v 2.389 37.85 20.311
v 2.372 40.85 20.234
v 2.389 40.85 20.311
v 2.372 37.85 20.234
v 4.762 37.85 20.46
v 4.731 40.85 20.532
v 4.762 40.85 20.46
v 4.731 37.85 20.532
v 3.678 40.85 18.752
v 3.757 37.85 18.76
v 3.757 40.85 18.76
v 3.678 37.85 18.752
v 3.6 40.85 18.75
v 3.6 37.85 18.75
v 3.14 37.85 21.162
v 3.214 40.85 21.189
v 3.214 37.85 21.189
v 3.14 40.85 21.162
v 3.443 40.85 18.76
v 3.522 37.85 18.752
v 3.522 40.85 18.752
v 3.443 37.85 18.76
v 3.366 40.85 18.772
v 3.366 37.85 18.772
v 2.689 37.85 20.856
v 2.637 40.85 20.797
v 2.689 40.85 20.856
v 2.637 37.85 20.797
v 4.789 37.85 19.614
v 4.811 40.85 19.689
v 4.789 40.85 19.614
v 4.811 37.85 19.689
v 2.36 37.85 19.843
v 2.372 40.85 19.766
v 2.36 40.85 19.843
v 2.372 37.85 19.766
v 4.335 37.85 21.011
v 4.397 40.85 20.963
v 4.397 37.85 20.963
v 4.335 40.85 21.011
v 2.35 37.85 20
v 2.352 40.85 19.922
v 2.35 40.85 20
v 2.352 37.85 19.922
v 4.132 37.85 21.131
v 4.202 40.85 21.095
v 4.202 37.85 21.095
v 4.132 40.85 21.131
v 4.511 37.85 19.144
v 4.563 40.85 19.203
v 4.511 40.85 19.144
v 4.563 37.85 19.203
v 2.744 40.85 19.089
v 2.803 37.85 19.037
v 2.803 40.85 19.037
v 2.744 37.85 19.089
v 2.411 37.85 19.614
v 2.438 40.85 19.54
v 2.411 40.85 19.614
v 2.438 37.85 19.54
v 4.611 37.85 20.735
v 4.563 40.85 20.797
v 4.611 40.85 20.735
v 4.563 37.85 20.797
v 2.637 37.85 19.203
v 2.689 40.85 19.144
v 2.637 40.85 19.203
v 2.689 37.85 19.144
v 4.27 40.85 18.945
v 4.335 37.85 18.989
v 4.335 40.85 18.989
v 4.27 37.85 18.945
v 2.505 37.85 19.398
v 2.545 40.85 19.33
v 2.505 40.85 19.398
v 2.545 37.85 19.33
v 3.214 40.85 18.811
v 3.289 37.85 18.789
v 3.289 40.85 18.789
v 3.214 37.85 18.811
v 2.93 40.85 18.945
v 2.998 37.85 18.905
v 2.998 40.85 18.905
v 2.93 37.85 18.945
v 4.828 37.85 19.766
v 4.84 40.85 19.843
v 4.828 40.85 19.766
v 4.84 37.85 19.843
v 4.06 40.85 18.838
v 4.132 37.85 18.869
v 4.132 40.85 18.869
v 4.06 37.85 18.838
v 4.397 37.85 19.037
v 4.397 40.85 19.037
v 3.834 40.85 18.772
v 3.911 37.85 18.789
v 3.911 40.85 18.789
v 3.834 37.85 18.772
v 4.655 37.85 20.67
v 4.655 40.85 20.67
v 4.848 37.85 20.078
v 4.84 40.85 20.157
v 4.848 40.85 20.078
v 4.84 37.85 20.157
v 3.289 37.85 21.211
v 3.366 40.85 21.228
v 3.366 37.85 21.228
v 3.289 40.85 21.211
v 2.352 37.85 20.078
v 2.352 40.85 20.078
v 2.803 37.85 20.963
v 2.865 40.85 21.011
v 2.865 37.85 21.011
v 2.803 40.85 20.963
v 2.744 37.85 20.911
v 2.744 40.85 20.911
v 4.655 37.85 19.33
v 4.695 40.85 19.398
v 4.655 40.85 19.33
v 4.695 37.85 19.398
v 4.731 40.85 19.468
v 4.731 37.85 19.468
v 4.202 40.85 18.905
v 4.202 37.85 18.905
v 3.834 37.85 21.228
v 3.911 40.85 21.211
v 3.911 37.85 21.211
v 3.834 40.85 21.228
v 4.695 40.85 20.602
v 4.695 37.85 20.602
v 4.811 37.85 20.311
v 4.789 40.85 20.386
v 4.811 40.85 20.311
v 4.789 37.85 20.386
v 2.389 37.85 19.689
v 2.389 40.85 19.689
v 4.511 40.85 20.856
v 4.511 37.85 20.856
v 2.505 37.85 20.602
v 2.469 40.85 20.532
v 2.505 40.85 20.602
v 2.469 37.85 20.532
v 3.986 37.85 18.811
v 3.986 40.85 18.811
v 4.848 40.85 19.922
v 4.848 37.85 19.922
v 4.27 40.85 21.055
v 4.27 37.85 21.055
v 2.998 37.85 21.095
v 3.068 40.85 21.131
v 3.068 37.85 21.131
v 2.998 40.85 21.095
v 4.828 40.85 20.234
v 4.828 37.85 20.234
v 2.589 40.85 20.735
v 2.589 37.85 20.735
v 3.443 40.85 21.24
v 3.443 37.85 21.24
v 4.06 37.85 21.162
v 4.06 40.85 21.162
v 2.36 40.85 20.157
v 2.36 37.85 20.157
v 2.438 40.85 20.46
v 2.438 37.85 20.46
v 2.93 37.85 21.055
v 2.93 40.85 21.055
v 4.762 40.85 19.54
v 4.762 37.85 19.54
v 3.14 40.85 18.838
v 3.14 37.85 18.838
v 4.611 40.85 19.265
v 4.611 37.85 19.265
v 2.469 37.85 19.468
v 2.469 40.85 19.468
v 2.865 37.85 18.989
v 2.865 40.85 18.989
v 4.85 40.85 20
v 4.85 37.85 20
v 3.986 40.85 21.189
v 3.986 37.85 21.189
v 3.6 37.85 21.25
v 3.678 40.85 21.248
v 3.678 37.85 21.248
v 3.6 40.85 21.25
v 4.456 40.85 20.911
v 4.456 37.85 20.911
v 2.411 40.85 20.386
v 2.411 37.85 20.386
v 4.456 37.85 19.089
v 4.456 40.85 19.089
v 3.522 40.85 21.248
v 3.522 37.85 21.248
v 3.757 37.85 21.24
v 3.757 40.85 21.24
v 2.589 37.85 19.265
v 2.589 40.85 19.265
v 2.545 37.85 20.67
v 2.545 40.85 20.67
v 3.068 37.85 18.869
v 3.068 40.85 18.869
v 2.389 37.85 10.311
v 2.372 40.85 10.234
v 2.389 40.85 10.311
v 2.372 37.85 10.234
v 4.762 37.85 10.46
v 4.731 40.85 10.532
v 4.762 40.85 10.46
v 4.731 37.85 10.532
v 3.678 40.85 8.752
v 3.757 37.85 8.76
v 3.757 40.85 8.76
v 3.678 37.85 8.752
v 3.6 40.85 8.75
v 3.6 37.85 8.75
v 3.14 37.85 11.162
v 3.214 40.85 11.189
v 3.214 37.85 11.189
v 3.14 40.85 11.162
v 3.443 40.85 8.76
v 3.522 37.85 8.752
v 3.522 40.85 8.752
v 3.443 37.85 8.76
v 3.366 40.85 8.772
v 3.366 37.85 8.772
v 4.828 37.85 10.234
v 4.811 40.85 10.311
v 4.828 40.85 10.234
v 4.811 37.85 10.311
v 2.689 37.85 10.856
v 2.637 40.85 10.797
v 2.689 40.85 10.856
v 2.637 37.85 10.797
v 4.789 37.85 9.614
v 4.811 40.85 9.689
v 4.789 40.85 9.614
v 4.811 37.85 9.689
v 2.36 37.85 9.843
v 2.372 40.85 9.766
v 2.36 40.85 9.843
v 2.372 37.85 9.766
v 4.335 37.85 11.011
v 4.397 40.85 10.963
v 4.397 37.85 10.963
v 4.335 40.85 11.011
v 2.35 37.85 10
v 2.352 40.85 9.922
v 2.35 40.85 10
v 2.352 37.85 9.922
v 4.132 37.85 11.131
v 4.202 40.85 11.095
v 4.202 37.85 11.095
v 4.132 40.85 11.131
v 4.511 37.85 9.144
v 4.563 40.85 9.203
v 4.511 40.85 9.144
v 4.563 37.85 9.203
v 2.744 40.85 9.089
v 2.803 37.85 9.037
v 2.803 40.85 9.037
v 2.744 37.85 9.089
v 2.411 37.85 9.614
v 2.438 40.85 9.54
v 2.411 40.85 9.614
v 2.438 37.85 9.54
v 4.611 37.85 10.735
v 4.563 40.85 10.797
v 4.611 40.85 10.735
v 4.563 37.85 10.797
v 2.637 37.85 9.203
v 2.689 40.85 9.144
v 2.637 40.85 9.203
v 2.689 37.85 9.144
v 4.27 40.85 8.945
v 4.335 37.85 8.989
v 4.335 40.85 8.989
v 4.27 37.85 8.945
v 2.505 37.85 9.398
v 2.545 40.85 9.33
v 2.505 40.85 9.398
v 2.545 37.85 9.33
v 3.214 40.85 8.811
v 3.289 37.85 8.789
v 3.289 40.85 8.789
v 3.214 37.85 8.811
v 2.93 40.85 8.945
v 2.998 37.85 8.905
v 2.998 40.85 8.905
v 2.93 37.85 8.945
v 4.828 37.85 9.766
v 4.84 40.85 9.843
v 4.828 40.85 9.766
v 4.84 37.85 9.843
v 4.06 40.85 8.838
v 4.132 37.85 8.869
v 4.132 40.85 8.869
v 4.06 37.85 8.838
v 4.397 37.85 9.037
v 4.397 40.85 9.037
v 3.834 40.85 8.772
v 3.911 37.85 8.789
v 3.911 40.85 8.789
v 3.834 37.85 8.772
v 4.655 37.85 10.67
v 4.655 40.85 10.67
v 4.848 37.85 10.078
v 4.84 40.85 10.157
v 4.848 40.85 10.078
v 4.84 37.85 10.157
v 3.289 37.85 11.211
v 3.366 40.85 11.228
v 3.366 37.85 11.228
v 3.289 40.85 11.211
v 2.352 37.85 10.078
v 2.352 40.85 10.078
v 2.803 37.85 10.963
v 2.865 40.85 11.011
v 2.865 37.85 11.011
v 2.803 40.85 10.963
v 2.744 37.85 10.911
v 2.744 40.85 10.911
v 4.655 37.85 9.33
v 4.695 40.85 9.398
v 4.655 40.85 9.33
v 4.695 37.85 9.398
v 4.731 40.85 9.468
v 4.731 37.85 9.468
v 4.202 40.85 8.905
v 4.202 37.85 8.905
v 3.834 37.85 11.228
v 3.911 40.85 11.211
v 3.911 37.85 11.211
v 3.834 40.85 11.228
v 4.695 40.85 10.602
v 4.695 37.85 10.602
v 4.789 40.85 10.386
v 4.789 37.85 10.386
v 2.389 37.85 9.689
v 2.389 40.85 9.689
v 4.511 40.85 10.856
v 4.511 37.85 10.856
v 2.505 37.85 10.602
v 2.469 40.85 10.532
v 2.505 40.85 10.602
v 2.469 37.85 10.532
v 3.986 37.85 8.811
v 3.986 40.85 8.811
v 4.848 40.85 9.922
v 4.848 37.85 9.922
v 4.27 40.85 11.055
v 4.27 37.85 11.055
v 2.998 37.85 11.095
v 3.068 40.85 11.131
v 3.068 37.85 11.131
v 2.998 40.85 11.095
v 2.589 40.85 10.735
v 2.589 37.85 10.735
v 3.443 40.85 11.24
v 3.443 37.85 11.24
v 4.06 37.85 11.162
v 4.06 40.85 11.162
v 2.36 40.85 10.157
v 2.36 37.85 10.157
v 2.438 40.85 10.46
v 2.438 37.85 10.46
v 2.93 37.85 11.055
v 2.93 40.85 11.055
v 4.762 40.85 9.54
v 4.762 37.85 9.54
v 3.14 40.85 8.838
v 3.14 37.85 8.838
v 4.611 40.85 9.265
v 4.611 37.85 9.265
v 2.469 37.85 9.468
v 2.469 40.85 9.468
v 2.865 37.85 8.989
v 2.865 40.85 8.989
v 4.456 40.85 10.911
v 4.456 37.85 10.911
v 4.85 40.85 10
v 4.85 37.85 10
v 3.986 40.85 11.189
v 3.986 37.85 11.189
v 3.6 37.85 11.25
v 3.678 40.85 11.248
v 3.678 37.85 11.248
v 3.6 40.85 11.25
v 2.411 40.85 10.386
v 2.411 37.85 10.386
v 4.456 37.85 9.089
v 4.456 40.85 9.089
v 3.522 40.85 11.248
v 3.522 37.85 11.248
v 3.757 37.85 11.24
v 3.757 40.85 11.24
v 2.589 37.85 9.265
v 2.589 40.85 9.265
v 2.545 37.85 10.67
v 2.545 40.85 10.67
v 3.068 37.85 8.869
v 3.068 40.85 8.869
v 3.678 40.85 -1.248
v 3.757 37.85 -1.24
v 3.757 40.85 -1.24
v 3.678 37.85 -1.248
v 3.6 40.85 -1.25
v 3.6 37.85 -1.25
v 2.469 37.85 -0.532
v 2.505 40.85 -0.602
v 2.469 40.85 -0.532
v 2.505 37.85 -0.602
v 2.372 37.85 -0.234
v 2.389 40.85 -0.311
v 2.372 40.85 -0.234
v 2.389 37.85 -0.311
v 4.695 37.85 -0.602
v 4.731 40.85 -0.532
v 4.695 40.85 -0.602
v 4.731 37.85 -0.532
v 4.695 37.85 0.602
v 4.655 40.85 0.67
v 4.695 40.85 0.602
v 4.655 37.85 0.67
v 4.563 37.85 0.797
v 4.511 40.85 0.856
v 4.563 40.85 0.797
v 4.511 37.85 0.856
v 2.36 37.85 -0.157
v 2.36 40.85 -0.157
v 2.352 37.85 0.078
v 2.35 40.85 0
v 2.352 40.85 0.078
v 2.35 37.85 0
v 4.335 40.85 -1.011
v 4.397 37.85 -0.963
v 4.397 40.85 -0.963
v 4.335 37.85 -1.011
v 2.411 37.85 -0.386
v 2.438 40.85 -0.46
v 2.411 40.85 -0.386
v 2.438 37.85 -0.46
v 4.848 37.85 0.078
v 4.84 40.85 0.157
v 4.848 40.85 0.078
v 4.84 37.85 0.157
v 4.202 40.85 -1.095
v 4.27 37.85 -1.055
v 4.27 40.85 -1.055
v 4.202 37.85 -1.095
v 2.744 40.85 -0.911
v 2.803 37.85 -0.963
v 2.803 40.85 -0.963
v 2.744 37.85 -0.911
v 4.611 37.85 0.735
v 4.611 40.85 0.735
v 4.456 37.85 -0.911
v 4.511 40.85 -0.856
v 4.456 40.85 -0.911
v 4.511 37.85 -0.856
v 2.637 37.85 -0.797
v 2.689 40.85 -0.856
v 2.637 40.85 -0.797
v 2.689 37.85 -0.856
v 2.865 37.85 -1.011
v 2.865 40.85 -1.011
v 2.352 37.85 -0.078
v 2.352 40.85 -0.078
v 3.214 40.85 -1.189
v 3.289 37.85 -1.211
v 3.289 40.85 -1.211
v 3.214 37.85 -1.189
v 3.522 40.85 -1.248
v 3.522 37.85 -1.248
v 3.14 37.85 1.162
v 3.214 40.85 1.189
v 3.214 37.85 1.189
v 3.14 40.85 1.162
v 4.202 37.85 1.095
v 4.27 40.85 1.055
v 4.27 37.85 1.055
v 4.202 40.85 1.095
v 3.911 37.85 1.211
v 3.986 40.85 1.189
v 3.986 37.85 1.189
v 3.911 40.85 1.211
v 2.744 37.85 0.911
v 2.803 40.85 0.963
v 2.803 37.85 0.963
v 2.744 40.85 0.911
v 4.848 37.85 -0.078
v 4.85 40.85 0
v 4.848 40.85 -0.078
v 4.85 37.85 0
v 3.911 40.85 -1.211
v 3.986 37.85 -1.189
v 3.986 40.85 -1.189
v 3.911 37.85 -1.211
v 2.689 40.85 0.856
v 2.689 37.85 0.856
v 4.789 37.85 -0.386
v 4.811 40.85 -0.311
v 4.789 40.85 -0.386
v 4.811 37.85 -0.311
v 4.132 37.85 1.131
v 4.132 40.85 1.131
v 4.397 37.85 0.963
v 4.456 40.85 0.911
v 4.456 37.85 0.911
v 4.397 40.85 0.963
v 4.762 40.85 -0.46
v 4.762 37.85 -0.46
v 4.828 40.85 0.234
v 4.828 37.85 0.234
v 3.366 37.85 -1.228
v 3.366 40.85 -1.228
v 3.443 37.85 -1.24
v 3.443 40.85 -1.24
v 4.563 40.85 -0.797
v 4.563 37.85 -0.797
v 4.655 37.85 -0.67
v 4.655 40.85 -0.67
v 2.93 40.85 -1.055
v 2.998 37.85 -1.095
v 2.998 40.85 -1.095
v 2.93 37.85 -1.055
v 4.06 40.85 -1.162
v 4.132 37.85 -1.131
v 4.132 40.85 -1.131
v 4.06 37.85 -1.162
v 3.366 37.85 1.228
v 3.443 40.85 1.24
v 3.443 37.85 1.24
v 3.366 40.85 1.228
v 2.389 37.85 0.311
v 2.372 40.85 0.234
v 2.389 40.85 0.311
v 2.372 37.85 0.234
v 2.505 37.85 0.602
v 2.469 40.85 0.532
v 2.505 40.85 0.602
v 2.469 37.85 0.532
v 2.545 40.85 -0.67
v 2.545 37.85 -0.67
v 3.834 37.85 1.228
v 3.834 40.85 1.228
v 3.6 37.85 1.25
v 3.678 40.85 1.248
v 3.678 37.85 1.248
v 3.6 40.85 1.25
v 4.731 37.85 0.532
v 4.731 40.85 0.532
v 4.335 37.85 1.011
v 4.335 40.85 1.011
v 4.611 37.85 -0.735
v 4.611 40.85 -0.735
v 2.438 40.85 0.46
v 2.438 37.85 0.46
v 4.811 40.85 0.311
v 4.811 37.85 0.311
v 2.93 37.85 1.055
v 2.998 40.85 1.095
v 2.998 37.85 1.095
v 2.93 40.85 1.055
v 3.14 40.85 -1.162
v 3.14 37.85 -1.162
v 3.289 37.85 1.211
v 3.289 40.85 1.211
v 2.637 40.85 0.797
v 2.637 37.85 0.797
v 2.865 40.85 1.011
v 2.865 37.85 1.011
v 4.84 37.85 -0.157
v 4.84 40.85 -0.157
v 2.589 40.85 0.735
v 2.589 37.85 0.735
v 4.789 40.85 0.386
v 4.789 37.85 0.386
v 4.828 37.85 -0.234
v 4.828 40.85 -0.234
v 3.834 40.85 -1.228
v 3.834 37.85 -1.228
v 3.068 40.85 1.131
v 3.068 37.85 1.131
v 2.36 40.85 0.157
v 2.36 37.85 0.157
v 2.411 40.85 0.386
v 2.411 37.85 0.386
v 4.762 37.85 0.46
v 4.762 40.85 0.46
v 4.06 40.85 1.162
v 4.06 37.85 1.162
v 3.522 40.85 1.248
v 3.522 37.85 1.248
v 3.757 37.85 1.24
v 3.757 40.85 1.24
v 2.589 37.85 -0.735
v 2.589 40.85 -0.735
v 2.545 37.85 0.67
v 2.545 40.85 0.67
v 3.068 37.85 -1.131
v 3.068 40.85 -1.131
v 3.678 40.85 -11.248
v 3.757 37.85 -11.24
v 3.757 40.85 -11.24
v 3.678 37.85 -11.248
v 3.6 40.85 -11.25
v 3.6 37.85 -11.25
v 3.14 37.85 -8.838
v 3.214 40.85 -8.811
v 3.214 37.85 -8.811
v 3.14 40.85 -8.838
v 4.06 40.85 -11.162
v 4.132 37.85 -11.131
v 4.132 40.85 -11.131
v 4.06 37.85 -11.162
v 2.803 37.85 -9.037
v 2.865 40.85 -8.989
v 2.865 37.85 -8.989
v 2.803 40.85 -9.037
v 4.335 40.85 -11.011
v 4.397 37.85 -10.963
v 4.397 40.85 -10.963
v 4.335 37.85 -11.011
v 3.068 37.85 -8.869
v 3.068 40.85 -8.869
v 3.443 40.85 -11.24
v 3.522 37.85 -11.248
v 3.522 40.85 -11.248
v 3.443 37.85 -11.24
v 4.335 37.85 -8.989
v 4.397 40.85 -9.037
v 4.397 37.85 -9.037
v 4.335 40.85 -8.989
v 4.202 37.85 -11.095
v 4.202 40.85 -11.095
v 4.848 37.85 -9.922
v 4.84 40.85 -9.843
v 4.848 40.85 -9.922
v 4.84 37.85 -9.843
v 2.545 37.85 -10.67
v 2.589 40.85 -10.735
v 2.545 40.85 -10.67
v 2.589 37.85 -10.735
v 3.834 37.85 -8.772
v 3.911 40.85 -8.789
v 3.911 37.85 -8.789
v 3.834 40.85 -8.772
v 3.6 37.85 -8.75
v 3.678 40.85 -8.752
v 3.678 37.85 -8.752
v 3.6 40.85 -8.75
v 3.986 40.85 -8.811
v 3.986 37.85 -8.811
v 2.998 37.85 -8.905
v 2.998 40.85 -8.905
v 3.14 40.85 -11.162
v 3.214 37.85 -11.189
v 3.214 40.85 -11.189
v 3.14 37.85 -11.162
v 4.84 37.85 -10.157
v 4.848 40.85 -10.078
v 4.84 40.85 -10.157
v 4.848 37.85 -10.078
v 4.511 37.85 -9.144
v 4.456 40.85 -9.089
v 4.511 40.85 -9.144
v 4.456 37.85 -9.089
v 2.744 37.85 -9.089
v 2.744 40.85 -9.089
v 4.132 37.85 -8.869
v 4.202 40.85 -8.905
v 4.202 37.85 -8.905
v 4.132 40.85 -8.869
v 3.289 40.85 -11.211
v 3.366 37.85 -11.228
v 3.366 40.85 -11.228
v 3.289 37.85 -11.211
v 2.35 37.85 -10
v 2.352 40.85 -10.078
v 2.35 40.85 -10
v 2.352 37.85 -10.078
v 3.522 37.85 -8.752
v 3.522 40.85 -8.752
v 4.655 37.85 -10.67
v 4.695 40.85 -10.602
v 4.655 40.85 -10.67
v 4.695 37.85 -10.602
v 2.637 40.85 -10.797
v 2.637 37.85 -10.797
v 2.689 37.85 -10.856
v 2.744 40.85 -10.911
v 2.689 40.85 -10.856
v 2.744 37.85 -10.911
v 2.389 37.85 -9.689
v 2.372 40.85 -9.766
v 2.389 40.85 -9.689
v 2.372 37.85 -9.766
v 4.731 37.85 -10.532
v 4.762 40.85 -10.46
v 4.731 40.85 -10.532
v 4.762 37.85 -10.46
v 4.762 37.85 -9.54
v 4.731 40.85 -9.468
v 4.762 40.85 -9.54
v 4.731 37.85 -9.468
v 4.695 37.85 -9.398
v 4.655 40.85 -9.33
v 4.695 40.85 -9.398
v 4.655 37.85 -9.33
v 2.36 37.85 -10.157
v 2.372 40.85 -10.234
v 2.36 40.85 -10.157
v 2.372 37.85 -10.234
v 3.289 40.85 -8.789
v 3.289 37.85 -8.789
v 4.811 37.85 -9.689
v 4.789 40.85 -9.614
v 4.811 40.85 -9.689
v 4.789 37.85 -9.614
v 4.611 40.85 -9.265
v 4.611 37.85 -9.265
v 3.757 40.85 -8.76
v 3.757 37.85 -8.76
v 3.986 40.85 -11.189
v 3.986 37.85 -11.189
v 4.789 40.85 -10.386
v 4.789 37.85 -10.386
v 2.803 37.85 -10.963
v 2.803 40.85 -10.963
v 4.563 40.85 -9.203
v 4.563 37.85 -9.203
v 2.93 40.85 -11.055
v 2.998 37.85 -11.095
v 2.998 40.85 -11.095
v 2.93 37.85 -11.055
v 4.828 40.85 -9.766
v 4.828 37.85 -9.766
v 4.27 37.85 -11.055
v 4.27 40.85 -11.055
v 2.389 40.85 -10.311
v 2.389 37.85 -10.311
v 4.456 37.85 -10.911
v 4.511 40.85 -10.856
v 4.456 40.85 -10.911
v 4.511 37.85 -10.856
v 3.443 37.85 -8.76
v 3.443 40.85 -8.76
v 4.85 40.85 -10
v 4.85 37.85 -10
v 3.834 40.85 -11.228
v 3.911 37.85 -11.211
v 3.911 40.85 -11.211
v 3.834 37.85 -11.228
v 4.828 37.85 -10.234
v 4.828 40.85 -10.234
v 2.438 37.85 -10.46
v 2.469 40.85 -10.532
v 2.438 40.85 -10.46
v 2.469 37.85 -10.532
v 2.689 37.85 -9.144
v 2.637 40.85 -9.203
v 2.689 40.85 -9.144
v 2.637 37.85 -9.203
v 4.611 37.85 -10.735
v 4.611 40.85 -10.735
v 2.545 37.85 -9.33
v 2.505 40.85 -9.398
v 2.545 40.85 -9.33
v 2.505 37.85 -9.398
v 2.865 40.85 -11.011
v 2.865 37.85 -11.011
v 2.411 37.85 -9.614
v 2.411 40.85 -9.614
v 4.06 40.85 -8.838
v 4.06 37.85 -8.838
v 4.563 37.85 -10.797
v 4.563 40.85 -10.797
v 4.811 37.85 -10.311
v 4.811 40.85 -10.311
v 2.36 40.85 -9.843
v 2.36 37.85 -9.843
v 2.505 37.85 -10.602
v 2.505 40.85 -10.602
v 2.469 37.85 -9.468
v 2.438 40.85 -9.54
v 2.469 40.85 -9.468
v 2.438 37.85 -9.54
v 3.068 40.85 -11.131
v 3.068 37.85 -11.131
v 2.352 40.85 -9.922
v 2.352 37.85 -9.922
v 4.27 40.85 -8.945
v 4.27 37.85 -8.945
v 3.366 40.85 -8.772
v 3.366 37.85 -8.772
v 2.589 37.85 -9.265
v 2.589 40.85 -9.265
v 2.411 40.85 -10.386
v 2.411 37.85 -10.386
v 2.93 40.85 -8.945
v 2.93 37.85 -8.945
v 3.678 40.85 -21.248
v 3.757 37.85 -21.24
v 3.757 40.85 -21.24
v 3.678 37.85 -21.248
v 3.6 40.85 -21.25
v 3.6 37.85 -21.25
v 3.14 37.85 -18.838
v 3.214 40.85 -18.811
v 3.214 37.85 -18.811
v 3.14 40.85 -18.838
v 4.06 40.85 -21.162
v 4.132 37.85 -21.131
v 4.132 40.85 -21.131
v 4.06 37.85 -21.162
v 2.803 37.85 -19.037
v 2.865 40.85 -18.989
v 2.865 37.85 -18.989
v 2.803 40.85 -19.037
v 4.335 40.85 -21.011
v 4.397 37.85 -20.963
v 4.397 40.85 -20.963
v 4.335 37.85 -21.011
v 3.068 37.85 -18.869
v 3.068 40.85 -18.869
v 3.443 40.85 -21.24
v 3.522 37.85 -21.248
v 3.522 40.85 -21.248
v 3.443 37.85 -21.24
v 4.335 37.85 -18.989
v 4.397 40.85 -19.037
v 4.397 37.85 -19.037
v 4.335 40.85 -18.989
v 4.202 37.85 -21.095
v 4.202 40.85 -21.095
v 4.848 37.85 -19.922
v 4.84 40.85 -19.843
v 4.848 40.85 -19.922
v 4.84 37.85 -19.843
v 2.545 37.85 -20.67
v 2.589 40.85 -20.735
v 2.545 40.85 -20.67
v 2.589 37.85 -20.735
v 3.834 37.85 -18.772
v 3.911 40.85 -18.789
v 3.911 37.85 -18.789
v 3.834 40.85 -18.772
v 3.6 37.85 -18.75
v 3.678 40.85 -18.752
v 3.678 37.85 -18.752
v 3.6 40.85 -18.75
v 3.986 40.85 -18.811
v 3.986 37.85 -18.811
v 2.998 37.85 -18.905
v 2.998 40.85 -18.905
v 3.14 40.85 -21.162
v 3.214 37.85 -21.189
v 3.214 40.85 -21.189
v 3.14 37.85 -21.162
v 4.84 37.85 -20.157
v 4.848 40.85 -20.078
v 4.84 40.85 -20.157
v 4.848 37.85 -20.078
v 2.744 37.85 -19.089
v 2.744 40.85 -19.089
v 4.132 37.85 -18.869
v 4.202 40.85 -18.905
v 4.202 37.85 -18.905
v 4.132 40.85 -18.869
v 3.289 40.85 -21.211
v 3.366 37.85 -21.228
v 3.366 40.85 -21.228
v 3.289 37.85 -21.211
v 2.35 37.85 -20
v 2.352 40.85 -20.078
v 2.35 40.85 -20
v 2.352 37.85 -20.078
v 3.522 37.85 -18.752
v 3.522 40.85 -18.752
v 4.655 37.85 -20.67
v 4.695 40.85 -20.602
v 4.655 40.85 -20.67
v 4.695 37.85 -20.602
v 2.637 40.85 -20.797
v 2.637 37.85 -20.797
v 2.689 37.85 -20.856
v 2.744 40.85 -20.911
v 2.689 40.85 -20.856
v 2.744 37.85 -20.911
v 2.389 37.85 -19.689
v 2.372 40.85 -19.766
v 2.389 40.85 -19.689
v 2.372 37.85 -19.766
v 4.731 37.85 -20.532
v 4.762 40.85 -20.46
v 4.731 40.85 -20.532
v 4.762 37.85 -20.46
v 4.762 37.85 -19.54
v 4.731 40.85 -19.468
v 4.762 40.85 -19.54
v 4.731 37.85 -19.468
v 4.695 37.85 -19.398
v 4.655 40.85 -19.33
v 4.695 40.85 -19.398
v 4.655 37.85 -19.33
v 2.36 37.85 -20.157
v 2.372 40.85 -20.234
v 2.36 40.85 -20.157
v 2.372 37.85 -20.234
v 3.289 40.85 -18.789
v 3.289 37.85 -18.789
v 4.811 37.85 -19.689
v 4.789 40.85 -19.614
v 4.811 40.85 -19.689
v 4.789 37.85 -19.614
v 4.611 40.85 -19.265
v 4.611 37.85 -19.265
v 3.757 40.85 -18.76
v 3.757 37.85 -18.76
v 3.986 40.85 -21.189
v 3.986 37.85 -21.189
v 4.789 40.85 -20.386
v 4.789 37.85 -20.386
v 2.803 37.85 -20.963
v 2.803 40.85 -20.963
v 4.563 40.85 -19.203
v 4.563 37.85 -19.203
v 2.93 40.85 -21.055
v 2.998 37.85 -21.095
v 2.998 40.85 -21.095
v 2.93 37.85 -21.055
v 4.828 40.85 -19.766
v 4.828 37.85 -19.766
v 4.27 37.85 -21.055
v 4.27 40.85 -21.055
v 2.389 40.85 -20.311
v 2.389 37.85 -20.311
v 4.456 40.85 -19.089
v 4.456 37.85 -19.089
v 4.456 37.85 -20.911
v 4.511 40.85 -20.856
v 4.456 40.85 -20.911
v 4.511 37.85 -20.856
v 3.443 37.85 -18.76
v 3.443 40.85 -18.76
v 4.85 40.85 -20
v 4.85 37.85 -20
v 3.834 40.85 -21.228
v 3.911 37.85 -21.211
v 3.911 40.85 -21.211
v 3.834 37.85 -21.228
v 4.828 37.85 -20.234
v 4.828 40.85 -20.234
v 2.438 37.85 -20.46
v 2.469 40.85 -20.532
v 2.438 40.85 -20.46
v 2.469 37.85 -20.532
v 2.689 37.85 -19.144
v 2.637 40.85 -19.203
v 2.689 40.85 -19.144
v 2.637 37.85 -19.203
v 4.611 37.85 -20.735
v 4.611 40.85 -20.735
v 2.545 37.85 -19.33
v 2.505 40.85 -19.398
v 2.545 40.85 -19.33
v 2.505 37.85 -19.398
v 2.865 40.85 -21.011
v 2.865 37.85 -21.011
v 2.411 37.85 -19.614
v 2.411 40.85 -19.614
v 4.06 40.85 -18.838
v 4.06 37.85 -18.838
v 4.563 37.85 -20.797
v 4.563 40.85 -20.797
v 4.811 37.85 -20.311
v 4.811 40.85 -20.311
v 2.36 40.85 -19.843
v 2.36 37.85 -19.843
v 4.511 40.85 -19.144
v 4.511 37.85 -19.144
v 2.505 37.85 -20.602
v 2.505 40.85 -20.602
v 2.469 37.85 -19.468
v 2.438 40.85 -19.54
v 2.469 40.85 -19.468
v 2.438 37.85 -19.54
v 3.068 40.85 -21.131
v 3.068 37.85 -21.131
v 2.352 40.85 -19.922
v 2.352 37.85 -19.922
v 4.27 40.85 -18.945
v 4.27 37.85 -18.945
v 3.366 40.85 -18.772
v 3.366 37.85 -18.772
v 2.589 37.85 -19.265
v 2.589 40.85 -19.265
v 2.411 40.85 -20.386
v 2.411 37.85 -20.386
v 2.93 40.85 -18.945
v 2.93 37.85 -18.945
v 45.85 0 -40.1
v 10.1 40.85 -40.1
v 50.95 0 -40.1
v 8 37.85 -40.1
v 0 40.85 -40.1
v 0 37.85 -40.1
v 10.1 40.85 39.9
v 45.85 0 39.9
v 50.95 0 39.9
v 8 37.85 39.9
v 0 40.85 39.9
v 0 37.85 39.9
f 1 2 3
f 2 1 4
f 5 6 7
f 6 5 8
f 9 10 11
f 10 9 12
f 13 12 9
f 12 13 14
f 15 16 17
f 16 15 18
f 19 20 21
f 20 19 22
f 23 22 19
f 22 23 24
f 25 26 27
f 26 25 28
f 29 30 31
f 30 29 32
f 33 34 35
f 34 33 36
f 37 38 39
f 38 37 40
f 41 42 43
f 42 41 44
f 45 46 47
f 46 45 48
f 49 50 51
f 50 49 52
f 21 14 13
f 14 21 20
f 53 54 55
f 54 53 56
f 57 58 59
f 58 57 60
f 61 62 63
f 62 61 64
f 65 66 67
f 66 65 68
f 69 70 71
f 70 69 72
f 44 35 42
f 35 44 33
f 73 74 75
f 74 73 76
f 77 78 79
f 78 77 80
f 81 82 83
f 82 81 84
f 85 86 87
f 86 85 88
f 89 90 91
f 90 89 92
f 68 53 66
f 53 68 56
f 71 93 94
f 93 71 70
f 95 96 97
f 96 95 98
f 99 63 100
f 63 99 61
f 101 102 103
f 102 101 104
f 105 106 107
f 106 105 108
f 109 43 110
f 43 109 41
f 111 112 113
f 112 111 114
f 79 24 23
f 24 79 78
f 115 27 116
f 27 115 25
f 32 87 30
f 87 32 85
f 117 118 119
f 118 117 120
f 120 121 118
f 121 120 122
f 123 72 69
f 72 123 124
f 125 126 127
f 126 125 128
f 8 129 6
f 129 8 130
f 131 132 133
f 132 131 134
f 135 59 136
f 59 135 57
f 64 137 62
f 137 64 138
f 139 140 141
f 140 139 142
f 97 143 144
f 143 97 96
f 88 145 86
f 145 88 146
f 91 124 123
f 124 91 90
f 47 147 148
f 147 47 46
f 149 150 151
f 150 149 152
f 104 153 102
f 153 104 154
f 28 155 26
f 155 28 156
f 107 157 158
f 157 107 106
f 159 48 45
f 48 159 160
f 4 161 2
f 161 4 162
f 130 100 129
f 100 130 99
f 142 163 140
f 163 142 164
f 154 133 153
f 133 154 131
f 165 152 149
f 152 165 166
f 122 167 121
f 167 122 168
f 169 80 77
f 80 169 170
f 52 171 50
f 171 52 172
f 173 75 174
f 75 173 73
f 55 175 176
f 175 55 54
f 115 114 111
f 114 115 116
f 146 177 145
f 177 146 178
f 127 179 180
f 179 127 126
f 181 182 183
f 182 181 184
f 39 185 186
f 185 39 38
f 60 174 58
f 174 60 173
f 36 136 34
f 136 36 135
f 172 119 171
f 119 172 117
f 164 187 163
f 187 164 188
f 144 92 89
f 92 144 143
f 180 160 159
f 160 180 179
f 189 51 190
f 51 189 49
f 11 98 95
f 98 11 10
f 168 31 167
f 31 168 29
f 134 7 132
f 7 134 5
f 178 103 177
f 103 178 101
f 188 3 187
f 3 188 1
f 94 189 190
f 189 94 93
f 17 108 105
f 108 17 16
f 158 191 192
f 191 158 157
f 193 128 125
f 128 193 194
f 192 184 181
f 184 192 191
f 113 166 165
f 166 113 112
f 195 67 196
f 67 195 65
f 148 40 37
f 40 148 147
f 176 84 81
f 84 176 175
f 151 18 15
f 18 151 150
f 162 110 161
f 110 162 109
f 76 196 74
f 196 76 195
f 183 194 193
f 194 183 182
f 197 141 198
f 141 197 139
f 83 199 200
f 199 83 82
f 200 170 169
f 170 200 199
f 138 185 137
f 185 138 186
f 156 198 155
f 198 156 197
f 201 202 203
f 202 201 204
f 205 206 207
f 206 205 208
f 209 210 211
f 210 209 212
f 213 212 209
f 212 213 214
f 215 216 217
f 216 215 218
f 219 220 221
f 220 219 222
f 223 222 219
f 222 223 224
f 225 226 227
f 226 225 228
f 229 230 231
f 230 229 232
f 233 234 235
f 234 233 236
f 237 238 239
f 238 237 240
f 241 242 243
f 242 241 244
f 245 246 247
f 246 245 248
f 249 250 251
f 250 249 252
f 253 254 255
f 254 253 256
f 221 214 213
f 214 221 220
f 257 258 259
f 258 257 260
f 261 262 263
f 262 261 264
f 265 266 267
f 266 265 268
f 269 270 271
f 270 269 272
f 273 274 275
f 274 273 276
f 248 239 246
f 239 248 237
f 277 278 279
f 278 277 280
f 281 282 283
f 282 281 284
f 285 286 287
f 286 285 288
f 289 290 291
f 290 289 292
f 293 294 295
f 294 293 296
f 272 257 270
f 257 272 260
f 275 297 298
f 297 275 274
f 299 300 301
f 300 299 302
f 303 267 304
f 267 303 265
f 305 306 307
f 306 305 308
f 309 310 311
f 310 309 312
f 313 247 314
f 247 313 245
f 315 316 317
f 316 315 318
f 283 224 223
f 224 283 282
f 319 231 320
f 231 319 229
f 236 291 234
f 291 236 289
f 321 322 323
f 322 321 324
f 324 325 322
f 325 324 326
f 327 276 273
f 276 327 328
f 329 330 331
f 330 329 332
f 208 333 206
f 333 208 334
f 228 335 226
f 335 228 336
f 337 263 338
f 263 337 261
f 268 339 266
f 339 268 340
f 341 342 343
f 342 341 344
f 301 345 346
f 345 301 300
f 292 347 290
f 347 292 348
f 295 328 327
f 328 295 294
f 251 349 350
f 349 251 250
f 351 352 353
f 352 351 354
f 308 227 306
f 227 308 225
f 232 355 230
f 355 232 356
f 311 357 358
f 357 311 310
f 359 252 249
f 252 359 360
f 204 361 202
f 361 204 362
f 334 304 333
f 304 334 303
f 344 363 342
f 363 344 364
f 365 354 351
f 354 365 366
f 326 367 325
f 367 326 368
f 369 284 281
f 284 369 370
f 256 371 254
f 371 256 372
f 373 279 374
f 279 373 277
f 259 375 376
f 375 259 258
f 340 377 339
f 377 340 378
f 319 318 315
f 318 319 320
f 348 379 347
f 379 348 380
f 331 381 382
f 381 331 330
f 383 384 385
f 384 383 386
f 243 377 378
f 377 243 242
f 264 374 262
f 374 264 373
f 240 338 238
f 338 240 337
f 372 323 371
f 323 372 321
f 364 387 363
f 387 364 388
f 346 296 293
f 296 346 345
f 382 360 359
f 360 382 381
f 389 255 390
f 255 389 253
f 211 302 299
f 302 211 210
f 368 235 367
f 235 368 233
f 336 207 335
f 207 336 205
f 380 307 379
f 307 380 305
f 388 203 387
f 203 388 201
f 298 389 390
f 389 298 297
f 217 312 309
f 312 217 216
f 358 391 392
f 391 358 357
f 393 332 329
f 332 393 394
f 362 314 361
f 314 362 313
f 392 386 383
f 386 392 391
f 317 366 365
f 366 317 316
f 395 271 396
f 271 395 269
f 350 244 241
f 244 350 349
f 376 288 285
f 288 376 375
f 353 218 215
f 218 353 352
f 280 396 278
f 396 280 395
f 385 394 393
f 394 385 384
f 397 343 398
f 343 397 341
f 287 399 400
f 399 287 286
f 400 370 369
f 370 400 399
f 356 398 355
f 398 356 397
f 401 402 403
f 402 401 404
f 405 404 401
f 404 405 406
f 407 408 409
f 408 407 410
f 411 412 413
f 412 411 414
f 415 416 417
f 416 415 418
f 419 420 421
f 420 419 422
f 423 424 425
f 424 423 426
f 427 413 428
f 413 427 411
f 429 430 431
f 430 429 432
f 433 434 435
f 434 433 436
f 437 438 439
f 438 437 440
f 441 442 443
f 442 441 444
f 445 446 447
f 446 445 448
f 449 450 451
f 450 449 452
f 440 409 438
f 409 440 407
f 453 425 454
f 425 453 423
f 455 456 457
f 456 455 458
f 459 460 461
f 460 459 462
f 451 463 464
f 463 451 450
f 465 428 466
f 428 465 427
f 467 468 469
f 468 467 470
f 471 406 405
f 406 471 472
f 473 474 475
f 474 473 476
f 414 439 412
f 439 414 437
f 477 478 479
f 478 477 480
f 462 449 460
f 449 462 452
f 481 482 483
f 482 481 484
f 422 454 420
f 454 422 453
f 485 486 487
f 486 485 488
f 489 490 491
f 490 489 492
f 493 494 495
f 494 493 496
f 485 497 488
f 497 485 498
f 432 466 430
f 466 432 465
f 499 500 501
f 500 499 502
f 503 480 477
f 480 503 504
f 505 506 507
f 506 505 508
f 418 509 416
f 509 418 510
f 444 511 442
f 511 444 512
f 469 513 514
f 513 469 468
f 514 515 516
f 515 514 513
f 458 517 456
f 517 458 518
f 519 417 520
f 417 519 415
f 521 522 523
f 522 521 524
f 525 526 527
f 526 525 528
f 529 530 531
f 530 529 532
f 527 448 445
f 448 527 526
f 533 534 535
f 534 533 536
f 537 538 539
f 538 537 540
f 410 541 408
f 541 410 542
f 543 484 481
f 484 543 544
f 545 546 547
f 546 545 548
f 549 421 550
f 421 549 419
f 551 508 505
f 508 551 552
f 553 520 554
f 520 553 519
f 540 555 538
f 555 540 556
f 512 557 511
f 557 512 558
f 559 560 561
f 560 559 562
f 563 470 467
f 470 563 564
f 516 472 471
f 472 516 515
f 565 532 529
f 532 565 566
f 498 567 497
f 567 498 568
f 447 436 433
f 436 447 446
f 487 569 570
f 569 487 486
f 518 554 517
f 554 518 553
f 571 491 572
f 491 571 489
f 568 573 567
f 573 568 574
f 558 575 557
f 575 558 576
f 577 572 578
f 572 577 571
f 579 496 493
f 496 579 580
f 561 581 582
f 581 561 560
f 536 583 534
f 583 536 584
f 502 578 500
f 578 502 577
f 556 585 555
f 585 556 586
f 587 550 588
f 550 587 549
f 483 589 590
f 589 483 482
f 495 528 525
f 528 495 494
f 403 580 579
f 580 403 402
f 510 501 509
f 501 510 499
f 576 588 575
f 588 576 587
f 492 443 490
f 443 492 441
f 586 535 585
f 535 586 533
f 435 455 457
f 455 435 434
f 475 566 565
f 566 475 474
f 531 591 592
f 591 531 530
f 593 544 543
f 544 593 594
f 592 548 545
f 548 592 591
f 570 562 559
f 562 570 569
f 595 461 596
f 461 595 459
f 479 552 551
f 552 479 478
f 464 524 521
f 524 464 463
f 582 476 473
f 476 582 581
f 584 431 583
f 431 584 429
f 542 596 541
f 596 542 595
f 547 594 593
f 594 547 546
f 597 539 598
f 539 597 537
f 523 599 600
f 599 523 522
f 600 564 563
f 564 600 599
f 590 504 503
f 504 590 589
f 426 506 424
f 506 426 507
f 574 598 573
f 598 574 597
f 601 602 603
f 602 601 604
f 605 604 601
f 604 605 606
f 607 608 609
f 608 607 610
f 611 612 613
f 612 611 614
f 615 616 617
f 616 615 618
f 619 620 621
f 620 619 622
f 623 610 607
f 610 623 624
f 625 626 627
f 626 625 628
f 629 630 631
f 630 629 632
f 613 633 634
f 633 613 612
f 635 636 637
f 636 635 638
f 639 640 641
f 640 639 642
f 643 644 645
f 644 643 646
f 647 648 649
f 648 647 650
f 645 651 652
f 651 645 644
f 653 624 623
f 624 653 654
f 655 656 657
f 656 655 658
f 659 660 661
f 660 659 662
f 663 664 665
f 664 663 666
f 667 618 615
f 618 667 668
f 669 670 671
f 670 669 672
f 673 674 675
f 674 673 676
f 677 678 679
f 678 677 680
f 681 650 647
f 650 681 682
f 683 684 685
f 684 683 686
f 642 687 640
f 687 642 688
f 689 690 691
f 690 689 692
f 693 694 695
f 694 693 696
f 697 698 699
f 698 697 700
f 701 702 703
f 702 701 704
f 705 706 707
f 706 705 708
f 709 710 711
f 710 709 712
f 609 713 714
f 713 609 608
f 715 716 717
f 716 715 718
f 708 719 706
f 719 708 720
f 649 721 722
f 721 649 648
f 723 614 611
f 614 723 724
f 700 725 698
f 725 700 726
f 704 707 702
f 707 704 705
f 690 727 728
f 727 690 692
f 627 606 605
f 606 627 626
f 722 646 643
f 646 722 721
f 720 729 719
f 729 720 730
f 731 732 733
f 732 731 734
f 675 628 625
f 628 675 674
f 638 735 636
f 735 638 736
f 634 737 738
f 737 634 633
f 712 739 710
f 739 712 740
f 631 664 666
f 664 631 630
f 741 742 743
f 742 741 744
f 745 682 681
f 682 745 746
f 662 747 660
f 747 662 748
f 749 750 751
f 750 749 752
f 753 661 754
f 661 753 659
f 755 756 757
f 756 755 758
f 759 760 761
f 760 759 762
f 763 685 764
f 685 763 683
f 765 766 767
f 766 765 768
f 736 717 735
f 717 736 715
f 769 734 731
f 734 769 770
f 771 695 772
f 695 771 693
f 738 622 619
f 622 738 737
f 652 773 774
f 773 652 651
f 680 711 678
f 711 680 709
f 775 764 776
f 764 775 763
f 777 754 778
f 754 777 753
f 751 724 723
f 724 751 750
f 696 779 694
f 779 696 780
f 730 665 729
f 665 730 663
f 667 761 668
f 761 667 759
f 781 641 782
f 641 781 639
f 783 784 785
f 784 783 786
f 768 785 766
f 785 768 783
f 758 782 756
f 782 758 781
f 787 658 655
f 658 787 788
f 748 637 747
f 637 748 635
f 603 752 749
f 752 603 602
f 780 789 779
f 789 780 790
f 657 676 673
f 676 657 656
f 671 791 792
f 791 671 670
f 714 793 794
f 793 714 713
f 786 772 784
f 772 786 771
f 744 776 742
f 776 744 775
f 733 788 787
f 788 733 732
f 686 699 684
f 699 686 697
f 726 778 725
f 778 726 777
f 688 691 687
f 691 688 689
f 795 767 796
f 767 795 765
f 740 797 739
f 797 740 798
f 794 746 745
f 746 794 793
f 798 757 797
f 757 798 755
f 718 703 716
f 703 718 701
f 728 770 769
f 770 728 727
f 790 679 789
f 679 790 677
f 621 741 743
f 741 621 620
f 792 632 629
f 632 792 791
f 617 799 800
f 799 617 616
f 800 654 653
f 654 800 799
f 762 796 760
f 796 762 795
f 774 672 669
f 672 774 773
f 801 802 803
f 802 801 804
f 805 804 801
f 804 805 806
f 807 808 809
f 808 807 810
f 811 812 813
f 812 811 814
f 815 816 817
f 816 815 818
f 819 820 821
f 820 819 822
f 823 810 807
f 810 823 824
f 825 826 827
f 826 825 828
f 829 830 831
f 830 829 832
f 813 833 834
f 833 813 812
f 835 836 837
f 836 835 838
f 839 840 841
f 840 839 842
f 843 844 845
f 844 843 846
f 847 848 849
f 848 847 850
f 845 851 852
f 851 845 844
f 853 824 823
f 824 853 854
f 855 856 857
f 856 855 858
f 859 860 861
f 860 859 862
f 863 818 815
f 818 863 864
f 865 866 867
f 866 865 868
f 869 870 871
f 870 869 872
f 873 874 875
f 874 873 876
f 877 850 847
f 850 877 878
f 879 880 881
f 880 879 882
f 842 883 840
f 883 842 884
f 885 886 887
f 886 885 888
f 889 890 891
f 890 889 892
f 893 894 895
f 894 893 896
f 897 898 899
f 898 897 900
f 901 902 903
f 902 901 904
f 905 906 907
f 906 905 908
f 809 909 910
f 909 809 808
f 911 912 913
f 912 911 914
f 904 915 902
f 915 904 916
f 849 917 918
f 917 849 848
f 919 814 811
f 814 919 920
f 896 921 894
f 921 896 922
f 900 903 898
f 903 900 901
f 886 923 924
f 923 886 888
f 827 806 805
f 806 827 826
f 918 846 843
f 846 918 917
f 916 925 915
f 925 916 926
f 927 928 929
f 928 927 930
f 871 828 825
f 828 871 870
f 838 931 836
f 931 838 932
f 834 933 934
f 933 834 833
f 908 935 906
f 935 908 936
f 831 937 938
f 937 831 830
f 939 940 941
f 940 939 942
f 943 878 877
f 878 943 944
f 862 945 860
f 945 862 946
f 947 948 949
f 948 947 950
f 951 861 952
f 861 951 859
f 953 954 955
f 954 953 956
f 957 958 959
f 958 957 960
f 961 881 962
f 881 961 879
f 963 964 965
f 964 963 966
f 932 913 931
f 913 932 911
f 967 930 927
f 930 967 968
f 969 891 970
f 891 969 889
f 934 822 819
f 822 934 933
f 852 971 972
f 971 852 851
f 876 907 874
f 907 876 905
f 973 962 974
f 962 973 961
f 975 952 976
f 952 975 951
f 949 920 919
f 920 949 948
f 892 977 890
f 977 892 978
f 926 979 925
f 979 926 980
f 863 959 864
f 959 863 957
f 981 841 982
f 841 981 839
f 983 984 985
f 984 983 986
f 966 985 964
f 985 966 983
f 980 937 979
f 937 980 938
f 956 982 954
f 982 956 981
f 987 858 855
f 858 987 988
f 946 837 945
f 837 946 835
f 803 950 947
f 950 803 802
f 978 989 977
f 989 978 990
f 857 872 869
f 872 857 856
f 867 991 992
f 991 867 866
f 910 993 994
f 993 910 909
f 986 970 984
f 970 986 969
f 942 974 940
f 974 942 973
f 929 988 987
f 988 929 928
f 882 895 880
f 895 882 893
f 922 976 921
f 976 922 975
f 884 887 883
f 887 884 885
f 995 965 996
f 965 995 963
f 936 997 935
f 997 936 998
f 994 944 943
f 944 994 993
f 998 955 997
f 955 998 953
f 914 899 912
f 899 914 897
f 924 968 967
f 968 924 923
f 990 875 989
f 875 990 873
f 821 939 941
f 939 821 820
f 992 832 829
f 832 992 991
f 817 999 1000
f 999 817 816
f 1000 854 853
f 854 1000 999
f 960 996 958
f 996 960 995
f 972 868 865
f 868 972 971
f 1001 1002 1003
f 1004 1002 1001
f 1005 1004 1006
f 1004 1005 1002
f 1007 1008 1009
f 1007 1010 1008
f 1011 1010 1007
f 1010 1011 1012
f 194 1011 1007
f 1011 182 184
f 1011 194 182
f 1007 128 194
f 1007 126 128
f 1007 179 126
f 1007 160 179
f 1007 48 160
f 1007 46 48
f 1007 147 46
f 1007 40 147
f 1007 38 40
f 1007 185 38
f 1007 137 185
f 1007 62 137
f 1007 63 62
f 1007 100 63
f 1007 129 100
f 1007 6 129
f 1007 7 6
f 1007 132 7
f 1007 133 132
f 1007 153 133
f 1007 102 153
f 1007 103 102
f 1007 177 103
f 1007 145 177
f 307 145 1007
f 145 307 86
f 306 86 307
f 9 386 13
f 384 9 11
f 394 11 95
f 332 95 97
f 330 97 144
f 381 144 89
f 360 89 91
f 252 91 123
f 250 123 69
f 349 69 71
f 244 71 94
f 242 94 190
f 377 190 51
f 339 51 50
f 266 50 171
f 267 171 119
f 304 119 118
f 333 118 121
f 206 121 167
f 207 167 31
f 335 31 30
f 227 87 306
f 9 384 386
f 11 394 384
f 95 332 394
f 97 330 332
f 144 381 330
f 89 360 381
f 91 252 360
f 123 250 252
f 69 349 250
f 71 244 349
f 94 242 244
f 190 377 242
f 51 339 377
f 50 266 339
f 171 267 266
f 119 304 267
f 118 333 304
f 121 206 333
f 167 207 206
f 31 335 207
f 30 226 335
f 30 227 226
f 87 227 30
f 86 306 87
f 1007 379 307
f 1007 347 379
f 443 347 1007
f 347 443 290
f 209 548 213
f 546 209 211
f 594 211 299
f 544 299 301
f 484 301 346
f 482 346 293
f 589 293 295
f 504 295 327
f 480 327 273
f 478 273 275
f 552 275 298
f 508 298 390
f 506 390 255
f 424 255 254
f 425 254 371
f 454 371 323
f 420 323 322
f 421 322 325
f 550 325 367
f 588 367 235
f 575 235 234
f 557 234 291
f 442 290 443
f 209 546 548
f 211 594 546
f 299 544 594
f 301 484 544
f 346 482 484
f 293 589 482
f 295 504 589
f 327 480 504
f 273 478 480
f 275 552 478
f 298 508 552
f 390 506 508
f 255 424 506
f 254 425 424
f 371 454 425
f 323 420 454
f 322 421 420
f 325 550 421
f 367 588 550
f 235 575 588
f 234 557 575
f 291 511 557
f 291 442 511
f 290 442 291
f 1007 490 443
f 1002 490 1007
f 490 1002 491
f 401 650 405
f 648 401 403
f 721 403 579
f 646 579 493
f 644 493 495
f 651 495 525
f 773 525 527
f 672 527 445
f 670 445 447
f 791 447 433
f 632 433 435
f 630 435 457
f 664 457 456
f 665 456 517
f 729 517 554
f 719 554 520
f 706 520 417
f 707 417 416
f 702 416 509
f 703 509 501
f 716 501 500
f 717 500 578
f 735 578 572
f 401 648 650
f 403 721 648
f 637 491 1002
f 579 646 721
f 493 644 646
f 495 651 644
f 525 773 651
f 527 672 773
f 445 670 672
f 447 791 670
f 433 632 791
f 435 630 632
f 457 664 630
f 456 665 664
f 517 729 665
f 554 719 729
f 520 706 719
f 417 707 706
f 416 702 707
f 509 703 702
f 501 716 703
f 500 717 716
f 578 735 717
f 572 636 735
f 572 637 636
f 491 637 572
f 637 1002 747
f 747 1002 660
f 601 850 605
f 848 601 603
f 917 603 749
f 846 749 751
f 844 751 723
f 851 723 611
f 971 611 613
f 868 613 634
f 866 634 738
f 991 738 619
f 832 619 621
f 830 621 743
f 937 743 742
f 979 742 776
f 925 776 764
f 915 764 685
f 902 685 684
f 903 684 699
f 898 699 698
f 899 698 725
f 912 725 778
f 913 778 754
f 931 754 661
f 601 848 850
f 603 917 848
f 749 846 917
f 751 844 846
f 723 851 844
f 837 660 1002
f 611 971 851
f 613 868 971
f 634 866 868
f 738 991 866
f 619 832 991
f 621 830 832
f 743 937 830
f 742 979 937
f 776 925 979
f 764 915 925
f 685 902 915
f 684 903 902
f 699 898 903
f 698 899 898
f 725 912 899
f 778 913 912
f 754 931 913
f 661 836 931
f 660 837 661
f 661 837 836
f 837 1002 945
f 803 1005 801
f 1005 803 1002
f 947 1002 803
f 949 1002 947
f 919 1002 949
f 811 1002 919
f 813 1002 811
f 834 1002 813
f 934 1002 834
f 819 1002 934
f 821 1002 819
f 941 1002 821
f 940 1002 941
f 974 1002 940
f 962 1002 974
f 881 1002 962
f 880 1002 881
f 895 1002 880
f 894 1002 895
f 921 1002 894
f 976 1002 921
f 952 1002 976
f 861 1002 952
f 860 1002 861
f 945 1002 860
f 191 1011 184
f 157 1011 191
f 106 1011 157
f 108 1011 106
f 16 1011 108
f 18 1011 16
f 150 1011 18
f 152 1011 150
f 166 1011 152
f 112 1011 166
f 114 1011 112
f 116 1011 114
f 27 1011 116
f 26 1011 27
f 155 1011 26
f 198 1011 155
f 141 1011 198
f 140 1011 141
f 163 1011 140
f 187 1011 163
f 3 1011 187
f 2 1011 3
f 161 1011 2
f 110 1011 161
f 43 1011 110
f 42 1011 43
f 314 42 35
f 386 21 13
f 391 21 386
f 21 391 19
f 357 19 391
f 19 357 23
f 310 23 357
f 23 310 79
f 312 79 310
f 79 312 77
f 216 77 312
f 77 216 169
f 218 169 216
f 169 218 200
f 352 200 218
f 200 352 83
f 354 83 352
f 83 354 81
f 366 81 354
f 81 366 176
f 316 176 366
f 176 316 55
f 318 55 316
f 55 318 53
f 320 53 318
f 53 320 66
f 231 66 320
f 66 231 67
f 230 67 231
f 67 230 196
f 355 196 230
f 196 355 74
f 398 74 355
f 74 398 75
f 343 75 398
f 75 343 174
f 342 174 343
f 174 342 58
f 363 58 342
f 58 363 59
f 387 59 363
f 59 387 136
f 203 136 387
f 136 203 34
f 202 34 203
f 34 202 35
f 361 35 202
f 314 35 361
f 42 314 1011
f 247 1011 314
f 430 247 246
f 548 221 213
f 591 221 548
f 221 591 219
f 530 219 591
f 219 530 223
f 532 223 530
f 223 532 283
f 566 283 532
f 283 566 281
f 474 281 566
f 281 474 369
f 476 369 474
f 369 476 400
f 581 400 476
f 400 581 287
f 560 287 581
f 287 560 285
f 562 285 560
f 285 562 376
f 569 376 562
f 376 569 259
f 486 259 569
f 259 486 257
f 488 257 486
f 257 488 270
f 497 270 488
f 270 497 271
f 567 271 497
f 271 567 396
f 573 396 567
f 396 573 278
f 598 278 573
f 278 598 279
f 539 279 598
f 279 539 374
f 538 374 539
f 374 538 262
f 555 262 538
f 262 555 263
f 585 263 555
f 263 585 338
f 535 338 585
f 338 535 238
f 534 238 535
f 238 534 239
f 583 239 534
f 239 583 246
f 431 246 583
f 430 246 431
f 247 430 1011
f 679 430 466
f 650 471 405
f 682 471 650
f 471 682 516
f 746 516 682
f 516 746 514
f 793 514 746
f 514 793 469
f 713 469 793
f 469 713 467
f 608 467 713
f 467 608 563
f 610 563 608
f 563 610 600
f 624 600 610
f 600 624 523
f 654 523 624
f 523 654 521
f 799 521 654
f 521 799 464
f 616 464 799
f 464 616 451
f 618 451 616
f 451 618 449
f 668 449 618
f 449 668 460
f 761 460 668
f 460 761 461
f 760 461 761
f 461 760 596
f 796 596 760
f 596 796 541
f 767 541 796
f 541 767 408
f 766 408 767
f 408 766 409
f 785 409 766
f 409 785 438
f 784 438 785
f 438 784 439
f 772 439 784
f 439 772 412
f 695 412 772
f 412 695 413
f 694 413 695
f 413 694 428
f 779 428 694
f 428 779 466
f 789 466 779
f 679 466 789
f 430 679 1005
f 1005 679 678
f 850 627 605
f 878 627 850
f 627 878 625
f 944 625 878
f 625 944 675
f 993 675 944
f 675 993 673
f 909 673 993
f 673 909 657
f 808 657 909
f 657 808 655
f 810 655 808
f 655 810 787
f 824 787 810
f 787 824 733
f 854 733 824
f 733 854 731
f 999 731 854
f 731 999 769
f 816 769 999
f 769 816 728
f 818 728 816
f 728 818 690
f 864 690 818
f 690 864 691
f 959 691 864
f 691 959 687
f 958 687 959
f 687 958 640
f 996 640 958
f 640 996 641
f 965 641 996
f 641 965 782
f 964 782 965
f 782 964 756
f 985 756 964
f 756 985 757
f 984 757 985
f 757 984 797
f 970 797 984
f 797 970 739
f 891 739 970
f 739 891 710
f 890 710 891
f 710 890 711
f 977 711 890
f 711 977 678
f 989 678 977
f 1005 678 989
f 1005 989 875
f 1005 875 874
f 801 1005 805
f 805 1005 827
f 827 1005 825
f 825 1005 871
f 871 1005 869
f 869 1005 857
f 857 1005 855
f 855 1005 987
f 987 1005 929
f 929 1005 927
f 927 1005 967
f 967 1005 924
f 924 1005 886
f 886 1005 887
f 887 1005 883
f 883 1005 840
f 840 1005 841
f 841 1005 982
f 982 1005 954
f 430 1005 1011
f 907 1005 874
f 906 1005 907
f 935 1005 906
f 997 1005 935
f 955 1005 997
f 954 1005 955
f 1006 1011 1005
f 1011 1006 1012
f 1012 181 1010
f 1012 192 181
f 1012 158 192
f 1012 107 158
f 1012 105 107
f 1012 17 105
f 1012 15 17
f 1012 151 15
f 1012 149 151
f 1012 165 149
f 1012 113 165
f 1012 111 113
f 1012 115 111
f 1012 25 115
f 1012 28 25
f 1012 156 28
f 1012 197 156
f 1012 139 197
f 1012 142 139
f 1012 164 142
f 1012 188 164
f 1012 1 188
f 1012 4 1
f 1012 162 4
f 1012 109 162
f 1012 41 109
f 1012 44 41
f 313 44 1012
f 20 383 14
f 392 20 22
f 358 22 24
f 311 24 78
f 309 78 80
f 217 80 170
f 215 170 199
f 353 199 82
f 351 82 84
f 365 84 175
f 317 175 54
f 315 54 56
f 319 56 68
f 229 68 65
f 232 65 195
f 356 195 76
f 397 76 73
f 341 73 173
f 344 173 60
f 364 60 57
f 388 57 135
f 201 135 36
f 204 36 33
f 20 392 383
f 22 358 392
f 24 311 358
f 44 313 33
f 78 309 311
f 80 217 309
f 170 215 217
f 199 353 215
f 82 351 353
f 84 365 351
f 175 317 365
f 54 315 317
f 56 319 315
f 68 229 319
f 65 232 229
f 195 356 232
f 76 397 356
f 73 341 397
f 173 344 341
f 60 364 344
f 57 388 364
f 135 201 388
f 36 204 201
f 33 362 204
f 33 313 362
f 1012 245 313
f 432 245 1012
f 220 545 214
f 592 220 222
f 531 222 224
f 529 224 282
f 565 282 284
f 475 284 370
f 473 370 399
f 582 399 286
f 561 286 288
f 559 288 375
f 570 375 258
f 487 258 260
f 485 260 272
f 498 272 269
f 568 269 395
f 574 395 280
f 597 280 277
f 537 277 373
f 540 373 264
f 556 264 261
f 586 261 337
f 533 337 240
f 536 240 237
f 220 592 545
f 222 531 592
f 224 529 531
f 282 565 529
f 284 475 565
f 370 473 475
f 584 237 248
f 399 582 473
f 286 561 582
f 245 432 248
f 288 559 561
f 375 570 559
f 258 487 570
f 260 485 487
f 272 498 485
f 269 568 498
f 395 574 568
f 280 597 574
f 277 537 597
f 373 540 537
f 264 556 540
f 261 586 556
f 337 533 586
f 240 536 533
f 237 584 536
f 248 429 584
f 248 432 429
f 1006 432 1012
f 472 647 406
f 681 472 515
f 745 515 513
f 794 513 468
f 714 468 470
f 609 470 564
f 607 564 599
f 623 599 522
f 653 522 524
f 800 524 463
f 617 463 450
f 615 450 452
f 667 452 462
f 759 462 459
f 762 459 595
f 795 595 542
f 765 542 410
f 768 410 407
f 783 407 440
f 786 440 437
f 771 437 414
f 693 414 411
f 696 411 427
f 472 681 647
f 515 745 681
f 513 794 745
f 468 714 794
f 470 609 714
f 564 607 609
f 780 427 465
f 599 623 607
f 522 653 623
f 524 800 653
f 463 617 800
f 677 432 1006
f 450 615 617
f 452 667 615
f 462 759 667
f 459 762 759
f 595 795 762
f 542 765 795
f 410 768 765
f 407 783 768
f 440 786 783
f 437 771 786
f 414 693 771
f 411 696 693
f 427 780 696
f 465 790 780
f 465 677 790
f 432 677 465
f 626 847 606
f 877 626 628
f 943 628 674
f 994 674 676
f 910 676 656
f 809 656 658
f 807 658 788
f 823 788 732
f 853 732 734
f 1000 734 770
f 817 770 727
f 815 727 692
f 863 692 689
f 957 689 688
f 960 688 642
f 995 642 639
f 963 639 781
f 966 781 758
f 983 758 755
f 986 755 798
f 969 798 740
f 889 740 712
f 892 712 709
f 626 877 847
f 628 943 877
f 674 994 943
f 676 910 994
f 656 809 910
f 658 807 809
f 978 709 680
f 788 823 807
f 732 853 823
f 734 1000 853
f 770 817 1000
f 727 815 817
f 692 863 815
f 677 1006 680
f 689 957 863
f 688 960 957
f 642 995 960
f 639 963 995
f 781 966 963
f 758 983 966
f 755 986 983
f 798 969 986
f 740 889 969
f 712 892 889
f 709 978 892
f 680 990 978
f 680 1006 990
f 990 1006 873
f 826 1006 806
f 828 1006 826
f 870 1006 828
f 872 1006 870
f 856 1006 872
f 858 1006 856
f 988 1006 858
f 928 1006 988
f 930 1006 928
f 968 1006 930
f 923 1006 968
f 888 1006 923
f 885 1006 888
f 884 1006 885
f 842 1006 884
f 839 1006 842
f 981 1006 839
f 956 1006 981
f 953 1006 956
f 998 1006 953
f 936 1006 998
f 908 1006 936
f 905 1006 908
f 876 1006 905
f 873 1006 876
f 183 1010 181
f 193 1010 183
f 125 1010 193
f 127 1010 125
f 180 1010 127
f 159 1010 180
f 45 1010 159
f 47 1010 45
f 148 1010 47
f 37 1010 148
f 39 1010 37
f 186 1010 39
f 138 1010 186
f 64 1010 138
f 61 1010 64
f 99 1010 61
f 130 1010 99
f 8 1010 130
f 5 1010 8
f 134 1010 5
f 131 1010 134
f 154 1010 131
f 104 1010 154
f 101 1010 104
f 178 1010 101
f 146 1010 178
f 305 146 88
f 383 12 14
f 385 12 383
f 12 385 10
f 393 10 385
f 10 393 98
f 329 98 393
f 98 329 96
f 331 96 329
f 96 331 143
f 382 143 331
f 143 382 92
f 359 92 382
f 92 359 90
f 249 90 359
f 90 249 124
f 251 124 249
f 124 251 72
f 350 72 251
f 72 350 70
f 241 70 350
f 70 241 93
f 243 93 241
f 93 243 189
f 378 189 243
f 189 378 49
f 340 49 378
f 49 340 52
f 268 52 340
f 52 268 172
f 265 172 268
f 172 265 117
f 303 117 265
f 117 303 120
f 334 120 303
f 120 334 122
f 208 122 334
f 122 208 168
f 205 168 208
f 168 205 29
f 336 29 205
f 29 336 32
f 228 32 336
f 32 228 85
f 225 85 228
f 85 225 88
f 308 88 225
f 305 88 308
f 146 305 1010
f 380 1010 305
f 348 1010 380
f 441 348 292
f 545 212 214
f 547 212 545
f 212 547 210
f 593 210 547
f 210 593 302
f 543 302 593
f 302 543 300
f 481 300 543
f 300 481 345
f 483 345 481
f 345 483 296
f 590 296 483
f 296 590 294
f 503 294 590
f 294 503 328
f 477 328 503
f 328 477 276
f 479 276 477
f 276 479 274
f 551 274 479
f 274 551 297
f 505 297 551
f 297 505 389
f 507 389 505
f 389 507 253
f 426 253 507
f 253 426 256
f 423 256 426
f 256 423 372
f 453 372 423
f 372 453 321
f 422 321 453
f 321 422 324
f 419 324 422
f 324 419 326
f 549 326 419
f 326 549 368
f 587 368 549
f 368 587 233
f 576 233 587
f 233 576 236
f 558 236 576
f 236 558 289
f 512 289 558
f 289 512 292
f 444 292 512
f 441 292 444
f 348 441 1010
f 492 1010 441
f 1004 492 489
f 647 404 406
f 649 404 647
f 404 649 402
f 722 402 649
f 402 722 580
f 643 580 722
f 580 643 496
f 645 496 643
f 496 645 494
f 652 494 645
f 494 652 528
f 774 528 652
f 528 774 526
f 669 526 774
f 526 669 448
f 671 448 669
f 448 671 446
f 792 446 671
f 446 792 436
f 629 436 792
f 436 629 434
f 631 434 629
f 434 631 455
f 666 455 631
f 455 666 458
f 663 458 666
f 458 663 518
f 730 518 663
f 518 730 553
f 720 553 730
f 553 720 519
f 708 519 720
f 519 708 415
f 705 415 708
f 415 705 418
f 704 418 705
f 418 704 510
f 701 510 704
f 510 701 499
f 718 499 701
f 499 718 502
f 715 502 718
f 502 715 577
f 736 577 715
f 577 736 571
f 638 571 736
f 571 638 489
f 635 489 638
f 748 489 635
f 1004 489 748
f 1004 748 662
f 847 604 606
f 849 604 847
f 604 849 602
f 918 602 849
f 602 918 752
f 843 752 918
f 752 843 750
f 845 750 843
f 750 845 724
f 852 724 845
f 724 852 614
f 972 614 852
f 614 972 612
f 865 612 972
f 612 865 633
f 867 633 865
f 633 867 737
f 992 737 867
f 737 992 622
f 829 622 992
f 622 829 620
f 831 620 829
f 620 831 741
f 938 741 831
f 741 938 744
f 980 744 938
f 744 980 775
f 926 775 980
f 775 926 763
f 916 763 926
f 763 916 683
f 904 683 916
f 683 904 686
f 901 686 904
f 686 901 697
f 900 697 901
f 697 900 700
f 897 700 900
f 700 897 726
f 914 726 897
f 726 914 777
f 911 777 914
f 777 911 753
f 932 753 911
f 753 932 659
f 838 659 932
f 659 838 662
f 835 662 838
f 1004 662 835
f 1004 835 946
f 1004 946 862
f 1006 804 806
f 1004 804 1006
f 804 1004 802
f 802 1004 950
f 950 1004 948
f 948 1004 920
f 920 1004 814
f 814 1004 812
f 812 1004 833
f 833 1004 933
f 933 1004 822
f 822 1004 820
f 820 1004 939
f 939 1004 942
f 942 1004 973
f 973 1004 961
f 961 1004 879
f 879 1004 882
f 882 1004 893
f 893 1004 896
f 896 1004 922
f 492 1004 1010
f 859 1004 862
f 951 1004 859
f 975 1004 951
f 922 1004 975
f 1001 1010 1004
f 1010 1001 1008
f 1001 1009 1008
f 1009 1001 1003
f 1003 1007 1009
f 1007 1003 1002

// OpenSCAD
$fn=100;

// All dimensions in mm
// rise is 31.5 for 2.6 inch wheels, add 0.25 inch for larger
Rise = (31.5 + 0.25 * 25.4);
MountWidth = 8; // from 0.1 * PlateLength in PlainBase.scad
Thickness = 3; // make the scoop a little thicker
ContactWidth = 0.7 * Thickness; // width of the scoop's shoe

ScoopLength = 80; // would really like 160, but the printer won't do it.

epsilon = 0.1; // little bit more to provide overlap

AccHoleSpace = 10; // from Plainbase.scad
HoleDia = 2.5; 

module AccessoryHoles()
{
  union() {
    for(idx = [-2:2]) {
      translate([idx * AccHoleSpace, 0, 0]) cylinder(d = HoleDia, h = Thickness * 2);
    }
  }
}

module Scoop() {
difference() {
  translate([0, 0, -(0.5 * ScoopLength + epsilon)])
    linear_extrude(height = ScoopLength)
      polygon(points = [ [0, Rise], [0, Rise + Thickness],
                         [MountWidth + ContactWidth, Rise + Thickness],
			 [MountWidth + ContactWidth + Rise + Thickness, 0],
			 [MountWidth + Rise, 0],
			 [MountWidth, Rise],
			 [0, Rise] ]);
  translate([0.45 * MountWidth, Rise + 1.5 * Thickness, 0]) rotate([90, 90, 0]) AccessoryHoles();    
}
}

Scoop();
